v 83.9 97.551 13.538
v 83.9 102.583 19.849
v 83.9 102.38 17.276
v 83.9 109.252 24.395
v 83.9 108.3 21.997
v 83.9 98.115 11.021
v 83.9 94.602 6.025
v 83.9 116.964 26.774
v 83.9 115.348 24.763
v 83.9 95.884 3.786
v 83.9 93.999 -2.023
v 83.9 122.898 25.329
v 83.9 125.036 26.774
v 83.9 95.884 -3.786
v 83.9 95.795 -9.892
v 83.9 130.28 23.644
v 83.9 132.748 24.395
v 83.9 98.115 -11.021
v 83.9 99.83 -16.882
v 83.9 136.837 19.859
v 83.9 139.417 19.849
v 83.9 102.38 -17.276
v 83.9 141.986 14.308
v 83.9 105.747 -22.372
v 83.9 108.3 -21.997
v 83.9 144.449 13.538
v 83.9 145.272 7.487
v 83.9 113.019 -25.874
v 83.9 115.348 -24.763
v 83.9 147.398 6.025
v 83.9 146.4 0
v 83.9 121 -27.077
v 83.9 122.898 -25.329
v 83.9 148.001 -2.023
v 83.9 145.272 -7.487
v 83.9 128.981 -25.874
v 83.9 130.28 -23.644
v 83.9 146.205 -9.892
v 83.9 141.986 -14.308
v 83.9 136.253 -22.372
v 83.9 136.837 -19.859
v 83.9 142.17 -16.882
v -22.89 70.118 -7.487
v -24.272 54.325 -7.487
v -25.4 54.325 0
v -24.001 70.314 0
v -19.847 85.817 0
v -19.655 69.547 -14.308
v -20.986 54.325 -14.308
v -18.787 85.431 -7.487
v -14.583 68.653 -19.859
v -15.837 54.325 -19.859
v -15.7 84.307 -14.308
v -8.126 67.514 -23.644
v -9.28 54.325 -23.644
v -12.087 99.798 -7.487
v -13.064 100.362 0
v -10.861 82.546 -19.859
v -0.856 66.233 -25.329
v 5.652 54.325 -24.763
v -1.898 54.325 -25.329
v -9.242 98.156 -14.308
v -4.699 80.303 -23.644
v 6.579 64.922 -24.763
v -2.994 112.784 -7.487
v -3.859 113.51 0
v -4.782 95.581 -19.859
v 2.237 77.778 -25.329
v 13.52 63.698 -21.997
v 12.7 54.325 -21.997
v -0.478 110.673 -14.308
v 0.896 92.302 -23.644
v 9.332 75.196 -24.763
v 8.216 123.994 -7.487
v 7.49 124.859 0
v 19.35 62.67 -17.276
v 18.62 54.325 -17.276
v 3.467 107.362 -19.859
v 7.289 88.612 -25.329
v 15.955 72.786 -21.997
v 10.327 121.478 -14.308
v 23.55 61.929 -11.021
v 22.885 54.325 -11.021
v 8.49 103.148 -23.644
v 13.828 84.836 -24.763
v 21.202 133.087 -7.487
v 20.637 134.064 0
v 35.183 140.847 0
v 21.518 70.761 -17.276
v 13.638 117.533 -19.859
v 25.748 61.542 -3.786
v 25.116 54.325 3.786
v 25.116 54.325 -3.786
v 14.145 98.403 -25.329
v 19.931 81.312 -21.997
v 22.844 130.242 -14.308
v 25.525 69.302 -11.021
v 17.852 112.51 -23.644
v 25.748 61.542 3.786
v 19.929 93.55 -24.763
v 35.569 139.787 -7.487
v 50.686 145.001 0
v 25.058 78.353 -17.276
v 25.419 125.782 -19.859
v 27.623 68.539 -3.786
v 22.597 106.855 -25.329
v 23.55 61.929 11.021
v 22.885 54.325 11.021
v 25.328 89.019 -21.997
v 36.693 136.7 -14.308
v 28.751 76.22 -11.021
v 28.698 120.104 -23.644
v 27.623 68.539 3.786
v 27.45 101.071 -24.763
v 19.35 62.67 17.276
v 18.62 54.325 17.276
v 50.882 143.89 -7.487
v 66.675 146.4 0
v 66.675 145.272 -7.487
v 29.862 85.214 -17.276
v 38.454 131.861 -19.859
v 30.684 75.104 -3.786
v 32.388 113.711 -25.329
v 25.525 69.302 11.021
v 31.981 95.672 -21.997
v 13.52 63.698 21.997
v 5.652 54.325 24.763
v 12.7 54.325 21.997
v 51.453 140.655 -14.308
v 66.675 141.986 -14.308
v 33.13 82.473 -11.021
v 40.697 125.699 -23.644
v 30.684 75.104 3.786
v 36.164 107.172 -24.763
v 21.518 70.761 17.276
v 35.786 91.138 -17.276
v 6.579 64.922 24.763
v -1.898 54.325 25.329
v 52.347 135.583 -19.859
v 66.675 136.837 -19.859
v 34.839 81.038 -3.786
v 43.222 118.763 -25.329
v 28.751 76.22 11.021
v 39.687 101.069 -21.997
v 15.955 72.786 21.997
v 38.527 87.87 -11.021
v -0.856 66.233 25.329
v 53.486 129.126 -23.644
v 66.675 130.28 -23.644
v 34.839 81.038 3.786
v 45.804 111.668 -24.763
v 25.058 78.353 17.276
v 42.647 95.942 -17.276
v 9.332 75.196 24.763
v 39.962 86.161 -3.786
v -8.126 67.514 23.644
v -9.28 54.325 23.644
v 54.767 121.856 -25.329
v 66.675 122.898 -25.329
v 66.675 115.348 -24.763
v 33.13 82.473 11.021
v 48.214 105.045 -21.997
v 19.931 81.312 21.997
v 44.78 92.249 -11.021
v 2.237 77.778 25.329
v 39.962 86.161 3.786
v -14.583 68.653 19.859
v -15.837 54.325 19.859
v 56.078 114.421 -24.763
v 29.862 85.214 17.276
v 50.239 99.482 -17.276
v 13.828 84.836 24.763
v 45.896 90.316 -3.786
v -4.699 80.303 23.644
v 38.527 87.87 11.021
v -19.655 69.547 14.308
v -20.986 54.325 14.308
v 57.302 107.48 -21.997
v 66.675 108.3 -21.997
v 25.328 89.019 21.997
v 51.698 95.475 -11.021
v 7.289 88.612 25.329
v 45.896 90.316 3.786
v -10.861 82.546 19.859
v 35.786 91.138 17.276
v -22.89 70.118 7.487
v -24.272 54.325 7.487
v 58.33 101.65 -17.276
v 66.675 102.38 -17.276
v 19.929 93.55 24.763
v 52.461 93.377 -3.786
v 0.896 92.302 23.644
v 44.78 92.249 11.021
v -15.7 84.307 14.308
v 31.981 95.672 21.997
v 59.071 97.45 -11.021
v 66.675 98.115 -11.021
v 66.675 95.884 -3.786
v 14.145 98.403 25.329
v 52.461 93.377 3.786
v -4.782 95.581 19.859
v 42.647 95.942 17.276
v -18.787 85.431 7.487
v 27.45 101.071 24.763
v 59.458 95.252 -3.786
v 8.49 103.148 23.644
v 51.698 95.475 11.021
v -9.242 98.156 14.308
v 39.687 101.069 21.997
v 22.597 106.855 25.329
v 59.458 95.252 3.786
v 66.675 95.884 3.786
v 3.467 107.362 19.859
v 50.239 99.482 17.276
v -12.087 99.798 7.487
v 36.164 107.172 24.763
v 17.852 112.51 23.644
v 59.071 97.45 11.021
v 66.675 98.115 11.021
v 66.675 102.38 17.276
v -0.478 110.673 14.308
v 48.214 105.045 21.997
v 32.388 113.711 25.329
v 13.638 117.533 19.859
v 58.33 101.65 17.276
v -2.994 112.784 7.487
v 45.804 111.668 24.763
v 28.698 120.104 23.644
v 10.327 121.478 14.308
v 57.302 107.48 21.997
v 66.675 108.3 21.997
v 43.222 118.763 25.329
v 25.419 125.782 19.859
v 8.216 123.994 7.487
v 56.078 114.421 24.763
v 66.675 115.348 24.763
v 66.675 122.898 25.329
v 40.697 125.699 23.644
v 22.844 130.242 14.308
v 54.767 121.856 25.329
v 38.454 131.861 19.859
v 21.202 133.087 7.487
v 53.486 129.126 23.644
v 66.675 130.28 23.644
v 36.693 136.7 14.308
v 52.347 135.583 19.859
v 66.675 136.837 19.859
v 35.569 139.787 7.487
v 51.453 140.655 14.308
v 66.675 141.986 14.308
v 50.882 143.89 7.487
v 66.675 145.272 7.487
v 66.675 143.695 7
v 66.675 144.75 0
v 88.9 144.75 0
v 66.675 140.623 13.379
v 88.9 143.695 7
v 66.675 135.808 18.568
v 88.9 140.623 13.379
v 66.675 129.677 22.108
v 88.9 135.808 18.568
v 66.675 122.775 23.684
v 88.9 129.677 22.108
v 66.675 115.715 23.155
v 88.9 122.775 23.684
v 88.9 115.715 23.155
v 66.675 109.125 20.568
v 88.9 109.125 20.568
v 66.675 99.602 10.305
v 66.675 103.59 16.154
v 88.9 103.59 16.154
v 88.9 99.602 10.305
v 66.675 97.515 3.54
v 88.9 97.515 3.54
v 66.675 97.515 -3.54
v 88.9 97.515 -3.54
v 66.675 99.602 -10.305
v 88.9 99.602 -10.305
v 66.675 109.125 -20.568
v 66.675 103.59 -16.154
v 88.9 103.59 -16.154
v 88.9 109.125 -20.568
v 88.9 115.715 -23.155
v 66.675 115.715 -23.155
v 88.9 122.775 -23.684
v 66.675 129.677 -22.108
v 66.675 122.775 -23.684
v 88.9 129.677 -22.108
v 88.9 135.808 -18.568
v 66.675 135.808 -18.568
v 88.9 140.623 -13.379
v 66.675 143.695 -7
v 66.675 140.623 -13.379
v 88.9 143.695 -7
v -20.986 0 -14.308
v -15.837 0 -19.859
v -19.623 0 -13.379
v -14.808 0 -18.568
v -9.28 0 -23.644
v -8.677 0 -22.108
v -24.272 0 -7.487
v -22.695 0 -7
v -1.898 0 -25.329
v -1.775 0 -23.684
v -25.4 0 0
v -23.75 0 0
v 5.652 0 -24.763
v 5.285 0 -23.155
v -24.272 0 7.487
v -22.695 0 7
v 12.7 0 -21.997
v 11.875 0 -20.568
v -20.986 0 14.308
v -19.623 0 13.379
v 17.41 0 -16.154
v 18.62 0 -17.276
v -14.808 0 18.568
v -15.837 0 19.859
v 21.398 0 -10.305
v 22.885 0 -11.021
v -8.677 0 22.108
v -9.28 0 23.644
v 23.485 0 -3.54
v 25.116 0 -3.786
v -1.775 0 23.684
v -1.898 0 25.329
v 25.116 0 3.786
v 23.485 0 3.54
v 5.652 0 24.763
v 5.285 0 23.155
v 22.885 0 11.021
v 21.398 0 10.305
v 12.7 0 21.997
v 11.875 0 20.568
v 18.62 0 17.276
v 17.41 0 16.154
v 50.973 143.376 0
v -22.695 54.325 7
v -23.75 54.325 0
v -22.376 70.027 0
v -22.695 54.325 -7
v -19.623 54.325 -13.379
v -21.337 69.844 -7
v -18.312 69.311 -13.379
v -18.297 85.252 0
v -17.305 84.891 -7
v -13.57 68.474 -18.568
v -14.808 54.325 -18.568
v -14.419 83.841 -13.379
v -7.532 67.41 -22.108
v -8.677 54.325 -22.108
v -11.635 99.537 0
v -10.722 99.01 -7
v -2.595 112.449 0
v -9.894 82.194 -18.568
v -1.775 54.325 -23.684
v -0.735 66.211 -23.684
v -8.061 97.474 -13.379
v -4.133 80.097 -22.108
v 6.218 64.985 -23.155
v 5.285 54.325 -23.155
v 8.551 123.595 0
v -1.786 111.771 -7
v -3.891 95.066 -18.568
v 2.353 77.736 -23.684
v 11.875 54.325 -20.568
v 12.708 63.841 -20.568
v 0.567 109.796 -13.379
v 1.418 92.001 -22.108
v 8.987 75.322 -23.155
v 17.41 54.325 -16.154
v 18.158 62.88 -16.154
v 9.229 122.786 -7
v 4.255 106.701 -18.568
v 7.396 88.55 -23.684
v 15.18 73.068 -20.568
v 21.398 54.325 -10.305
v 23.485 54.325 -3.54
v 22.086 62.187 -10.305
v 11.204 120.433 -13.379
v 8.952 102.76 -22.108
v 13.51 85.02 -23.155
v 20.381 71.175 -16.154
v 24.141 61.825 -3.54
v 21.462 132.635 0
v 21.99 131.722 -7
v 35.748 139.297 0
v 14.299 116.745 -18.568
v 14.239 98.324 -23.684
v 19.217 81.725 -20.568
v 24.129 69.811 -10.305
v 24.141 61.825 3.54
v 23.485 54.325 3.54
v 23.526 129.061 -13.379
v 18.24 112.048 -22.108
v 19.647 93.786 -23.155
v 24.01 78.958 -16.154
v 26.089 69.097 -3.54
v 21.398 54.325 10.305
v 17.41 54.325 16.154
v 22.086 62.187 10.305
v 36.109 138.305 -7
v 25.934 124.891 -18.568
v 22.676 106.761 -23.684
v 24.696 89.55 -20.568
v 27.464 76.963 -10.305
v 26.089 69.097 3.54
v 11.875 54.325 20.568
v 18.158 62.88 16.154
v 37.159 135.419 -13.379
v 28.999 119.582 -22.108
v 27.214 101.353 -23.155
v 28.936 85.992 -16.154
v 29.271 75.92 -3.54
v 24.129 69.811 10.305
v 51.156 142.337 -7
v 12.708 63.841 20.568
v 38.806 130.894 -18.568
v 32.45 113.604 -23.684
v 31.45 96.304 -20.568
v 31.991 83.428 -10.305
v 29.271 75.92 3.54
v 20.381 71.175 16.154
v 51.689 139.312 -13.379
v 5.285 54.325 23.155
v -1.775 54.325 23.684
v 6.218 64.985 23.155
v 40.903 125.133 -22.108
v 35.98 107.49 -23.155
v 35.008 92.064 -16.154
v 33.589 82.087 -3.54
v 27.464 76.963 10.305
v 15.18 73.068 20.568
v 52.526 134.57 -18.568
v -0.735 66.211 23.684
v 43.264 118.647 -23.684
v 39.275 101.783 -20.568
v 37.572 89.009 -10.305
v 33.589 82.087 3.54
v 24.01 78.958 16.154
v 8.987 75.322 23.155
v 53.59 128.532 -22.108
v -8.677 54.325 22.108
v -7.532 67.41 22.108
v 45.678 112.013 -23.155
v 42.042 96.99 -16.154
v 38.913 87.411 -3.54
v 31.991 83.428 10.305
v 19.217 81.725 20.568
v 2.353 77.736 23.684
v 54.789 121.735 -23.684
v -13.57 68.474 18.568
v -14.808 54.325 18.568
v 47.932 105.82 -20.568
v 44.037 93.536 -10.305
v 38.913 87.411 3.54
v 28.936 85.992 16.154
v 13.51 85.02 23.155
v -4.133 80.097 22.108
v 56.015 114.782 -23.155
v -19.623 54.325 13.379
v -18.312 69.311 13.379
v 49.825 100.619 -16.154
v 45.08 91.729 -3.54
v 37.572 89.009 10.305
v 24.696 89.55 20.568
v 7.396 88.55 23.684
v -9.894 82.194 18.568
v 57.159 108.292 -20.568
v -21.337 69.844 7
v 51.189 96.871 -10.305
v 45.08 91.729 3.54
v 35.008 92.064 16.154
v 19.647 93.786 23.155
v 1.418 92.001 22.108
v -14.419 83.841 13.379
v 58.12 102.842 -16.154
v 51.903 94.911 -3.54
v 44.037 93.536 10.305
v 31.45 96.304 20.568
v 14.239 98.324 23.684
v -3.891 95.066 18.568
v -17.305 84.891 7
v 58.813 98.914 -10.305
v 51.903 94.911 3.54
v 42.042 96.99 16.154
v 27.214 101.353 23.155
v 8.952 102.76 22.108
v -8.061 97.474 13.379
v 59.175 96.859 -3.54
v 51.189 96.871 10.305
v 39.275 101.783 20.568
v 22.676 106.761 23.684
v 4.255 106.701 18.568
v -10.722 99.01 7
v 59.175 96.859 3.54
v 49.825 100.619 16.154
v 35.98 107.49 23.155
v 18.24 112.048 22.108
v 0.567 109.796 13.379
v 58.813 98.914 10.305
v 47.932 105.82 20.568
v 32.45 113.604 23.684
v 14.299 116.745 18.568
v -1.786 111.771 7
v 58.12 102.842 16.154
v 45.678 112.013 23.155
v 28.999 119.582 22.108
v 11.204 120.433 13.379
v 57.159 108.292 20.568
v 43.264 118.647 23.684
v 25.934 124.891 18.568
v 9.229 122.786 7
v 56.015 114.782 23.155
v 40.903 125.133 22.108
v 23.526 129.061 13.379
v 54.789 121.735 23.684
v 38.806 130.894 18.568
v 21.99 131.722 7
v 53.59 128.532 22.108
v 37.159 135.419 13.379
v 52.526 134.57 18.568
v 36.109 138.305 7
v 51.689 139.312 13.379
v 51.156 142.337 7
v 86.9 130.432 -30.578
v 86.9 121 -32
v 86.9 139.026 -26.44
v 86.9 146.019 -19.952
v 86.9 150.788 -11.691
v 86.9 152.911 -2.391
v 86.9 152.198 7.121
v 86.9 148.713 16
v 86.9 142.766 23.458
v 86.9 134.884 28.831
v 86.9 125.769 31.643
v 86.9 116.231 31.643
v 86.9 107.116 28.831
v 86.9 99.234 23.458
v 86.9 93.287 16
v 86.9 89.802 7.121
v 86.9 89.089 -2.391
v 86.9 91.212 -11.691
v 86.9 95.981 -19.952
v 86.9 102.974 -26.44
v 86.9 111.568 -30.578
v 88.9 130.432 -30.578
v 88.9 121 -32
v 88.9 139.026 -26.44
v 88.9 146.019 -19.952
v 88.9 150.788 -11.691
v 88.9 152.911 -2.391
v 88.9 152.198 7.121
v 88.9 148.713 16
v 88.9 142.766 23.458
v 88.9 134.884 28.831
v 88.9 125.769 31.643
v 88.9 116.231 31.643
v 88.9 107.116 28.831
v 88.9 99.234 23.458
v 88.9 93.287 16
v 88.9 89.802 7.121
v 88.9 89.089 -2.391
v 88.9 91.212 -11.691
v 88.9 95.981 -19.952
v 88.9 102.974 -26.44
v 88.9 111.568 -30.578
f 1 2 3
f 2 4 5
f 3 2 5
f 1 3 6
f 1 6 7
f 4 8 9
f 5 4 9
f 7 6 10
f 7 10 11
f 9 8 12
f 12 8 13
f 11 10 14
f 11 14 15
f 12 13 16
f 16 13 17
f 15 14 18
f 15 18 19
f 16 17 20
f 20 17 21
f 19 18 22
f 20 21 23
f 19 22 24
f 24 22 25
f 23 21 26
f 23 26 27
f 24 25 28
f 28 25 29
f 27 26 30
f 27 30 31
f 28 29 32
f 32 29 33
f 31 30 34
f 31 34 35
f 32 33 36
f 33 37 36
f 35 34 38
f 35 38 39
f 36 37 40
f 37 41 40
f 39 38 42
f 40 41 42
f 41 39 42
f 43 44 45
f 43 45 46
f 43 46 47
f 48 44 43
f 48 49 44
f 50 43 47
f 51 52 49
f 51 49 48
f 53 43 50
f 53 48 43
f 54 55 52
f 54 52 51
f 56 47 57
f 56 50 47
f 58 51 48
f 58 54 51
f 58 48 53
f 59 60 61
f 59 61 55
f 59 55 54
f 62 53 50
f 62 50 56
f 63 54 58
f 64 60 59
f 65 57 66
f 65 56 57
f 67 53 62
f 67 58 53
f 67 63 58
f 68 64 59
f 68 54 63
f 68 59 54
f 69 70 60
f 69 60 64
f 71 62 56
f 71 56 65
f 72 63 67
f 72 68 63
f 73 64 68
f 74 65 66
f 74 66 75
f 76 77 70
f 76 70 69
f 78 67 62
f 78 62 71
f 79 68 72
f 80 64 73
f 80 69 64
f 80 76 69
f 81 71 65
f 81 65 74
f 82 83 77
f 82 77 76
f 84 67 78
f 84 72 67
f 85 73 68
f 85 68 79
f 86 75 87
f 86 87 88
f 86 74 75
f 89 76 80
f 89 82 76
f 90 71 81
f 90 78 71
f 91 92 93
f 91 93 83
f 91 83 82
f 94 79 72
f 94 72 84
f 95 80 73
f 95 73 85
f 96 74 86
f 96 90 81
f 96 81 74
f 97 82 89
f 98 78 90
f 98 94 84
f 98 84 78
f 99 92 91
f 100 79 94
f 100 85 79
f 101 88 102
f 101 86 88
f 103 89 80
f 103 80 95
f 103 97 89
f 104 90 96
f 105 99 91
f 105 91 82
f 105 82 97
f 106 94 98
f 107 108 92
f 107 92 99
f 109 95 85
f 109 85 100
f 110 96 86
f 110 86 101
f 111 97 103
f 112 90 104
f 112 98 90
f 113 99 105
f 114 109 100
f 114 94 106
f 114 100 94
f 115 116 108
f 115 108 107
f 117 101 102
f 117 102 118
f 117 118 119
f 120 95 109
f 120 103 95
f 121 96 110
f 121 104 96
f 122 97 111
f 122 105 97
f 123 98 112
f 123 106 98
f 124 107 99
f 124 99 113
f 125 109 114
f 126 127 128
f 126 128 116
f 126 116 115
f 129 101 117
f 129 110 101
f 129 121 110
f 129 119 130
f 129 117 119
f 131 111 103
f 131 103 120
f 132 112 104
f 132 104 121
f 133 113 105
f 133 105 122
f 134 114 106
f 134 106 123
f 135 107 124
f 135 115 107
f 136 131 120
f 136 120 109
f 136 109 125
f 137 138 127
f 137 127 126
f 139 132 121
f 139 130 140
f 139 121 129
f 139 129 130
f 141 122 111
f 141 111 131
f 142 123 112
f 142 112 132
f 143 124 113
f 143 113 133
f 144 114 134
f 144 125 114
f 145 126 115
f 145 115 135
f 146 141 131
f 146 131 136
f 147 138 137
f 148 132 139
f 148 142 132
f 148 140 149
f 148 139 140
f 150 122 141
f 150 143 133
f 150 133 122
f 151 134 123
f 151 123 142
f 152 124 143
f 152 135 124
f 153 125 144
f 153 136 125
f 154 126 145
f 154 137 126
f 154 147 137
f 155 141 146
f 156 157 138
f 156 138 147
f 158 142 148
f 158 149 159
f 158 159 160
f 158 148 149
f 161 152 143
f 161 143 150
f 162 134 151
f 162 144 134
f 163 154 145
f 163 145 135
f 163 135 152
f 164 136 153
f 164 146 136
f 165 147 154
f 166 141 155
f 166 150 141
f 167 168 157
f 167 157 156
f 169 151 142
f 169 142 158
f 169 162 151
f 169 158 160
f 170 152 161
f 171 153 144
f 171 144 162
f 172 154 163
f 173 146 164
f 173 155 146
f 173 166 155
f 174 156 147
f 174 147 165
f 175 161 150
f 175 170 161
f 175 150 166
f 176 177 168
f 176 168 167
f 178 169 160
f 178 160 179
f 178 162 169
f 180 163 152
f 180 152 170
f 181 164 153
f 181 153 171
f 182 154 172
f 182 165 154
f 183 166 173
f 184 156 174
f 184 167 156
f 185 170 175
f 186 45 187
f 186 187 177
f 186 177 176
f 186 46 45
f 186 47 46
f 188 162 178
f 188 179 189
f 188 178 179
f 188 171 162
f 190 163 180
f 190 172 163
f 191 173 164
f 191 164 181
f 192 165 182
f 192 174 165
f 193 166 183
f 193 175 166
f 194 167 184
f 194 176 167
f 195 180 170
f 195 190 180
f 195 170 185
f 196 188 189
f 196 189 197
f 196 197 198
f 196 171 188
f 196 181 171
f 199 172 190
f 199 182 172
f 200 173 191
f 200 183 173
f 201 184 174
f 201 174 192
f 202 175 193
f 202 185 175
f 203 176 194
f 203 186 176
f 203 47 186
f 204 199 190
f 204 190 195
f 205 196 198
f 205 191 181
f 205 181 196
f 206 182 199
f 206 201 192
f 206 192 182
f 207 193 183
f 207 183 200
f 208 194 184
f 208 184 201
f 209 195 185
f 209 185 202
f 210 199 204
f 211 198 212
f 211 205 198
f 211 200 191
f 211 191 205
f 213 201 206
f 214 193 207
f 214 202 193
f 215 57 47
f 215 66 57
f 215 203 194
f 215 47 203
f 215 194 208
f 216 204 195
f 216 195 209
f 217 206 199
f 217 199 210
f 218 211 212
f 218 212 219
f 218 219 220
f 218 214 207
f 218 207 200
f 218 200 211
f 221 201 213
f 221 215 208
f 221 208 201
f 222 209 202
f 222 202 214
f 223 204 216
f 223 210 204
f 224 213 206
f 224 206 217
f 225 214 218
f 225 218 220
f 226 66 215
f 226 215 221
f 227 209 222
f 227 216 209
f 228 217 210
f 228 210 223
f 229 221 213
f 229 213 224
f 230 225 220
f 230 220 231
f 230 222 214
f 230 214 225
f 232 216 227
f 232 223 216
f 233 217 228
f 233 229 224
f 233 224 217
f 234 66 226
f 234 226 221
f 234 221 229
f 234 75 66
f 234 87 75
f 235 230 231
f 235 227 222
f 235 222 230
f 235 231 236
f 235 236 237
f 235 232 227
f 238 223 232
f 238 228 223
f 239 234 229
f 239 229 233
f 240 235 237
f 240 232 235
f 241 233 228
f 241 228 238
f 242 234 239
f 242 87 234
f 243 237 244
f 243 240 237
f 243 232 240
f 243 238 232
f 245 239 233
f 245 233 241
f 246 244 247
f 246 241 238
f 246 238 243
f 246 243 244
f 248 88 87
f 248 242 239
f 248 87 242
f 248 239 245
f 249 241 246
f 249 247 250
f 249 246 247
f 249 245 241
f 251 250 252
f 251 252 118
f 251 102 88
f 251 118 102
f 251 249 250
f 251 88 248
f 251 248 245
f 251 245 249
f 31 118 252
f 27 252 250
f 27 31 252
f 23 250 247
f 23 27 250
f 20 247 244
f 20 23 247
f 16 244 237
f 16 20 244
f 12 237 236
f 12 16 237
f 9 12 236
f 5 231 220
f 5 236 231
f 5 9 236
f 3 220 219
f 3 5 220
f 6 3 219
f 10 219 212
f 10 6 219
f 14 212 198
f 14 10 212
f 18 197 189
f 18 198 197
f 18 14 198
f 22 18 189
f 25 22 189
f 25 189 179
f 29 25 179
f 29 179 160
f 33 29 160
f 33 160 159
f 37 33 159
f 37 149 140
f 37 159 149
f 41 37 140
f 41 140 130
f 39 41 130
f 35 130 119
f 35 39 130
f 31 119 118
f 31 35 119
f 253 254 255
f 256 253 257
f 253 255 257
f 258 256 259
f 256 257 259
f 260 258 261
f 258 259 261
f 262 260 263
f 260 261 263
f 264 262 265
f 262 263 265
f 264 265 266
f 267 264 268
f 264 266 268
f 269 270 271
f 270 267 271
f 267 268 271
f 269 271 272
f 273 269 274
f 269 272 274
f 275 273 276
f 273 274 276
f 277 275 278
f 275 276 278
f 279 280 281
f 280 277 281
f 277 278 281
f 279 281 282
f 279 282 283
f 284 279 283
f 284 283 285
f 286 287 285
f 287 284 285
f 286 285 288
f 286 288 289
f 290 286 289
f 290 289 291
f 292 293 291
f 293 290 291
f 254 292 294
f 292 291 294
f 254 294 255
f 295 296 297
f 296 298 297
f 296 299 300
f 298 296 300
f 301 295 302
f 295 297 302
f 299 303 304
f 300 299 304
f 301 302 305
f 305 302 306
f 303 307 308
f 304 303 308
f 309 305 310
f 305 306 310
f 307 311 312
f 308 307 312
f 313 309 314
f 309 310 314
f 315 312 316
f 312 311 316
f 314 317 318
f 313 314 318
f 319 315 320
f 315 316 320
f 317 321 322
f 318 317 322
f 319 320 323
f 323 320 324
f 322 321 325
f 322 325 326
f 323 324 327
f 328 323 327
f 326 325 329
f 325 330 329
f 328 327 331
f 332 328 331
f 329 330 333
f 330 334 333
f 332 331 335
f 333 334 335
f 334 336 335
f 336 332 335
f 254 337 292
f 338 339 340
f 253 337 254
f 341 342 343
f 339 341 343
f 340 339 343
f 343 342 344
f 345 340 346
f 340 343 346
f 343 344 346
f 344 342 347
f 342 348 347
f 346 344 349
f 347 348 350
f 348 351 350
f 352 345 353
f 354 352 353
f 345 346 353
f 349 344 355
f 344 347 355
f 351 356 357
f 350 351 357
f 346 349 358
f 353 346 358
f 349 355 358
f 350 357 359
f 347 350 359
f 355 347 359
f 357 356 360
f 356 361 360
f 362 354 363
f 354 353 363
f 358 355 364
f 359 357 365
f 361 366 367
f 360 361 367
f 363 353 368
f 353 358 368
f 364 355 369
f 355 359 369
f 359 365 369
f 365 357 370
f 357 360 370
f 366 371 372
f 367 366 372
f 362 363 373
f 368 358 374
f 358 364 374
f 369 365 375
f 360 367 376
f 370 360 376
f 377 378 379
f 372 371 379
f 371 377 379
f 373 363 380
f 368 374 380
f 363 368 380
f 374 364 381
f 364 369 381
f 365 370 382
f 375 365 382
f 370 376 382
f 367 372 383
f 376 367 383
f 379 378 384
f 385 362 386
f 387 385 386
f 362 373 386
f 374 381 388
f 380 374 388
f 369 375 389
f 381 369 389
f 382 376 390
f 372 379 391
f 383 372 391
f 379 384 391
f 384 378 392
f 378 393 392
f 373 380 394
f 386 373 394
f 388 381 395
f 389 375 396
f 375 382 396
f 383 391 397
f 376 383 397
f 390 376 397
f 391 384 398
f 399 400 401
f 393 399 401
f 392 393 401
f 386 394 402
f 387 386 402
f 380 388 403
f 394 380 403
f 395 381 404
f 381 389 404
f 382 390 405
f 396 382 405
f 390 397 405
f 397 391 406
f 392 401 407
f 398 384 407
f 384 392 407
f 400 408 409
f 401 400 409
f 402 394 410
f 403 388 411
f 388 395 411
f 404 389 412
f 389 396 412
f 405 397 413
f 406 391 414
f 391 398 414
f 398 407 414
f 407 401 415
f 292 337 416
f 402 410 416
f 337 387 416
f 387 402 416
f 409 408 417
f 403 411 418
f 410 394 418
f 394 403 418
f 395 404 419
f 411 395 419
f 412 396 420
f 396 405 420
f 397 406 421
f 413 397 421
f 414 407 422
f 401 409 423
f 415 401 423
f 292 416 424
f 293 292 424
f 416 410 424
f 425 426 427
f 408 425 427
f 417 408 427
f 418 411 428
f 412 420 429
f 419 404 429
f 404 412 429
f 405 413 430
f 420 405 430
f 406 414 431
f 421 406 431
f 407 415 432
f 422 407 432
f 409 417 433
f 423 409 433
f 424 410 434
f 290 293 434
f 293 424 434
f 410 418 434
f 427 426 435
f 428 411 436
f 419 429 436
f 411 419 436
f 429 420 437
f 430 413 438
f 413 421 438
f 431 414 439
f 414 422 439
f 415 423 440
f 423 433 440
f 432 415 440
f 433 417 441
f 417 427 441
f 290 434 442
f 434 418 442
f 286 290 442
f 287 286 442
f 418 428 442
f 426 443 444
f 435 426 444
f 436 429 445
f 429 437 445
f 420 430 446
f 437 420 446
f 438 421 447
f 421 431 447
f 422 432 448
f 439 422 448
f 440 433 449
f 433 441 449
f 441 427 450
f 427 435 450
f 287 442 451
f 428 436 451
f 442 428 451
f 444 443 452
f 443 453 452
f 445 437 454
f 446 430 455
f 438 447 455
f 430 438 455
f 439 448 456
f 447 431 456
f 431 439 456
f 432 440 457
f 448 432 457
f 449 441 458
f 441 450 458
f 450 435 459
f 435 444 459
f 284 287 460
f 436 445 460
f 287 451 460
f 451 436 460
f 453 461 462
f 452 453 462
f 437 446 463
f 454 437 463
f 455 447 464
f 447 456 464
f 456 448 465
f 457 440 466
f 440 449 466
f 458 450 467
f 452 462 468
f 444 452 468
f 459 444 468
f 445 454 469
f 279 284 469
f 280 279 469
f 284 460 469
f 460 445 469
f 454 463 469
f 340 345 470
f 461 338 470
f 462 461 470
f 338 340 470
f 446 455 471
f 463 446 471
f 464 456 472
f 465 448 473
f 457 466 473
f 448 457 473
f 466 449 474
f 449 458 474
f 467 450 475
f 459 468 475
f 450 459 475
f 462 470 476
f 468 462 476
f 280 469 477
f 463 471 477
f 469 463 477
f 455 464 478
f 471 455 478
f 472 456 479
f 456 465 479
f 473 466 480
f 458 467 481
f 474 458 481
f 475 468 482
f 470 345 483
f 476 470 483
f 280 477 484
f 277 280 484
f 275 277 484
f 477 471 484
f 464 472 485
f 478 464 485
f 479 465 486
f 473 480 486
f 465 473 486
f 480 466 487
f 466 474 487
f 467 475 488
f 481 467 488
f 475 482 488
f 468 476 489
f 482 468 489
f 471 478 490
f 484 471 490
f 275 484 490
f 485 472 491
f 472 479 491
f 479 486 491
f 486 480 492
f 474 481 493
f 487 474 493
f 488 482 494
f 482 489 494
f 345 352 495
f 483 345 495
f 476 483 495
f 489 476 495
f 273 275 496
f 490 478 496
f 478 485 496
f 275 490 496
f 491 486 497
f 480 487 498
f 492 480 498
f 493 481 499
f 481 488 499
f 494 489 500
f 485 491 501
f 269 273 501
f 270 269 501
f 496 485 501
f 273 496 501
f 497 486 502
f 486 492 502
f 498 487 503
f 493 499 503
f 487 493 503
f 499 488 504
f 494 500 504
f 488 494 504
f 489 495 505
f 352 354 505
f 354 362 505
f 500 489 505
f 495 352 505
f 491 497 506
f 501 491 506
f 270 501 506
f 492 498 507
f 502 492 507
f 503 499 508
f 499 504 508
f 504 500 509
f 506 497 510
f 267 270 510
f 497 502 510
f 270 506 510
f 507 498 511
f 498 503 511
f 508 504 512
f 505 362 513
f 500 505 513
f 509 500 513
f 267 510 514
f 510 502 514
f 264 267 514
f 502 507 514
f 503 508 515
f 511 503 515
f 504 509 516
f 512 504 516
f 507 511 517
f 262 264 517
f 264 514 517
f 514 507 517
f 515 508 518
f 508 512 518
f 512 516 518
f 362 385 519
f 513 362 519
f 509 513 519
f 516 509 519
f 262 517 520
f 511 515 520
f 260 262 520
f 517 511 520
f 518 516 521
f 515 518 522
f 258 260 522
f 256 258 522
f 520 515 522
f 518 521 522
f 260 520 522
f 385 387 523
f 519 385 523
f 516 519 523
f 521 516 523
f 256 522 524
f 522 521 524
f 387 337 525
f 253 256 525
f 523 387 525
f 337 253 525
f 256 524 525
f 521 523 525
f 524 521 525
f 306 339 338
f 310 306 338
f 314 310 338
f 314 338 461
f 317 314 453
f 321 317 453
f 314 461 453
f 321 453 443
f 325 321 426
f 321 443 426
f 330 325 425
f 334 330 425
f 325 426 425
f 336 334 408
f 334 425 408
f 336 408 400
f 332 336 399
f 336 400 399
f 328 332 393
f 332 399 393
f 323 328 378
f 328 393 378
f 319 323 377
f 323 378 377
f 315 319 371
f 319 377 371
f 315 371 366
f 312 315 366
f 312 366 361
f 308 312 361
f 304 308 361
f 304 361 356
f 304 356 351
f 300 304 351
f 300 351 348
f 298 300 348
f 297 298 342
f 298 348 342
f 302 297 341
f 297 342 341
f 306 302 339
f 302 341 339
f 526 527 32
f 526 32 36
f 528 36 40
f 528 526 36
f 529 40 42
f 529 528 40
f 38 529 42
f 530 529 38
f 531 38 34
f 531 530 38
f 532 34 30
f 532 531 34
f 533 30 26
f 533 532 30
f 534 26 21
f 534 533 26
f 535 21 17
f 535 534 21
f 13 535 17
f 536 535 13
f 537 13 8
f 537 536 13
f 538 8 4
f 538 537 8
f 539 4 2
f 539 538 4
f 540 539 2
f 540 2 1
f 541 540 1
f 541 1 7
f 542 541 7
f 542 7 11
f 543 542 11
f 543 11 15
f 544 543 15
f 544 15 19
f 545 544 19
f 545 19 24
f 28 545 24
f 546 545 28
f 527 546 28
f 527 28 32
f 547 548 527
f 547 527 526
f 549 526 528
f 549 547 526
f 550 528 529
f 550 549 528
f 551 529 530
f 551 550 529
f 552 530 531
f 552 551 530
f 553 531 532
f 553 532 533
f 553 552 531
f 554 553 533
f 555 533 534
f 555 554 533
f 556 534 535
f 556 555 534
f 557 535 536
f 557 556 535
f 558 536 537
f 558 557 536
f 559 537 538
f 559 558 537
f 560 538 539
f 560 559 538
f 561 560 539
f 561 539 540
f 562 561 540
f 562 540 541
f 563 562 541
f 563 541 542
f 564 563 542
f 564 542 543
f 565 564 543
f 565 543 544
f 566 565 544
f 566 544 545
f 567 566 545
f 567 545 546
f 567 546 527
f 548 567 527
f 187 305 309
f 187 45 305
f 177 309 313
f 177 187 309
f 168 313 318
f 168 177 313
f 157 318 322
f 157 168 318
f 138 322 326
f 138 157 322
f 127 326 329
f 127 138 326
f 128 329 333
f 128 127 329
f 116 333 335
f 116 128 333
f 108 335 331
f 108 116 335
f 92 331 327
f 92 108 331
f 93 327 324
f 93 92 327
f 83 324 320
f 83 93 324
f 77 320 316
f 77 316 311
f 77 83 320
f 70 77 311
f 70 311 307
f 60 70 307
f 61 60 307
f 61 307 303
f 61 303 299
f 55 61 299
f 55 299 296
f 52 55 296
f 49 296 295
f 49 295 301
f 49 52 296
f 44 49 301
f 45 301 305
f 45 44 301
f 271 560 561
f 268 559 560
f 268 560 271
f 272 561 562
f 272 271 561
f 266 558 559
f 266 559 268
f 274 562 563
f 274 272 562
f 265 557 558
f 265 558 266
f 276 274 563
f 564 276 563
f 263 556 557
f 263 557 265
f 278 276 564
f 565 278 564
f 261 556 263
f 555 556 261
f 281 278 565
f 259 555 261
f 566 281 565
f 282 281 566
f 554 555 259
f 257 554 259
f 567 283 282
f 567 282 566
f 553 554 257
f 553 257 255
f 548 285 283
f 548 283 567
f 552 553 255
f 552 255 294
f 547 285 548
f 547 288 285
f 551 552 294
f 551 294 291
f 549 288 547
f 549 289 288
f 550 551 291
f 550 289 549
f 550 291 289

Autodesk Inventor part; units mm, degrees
ref_plane "YZ Plane" through (0, 0, 0) normal (1, 0, 0) x (0, 1, 0)
ref_plane "XZ Plane" through (0, 0, 0) normal (0, 1, 0) x (-1, 0, 0)
ref_plane "XY Plane" through (0, 0, 0) normal (0, 0, 1) x (1, 0, 0)
sketch "Sketch1" plane through (0, 0, 0) normal (0, 0, 1) x (1, 0, 0)
  line L0 (0, 0) -> (0, 54.325)
  line L1 (66.675, 121) -> (88.9, 121)
  arc A0 (66.675, 121) -> (0, 54.325) centre (66.675, 54.325) ccw
  dimension "d1" = 121
  dimension "d2" = 88.9
  dimension "d4" = 66.675
sketch "Sketch2" plane through (0, 0, 0) normal (0, 1, 0) x (-1, 0, 0)
  circle A0 centre (0, 0) radius 25.4
  circle A1 centre (0, 0) radius 23.75
  dimension "d3" = 50.8
  dimension "d11" = 1.65
sweep "Sweep1" add profiles "Sketch2" path "Sketch1"
sketch "Sketch3" plane through (88.9, 121, 0) normal (1, 0, 0) x (0, 0, -1)
  circle A0 centre (0, 0) radius 25.4 projected
  circle A1 centre (0, 0) radius 32
  point P0 (0, -121)
  dimension "d6" = 64
extrude "Extrusion1" add sketch "Sketch3" against normal blind 5
chamfer "Chamfer1" distance 3 distance2 4.9231 1 edges at (83.9, 121, 32) measured on face at (85.5667, 118.4251, -31.8962)
equation "\"d4\" = 0.75 * d2"
equation "\"d15\" = 0.0769231 * d6"
properties part number "Ferrule 90 deg Elb-50.8"
